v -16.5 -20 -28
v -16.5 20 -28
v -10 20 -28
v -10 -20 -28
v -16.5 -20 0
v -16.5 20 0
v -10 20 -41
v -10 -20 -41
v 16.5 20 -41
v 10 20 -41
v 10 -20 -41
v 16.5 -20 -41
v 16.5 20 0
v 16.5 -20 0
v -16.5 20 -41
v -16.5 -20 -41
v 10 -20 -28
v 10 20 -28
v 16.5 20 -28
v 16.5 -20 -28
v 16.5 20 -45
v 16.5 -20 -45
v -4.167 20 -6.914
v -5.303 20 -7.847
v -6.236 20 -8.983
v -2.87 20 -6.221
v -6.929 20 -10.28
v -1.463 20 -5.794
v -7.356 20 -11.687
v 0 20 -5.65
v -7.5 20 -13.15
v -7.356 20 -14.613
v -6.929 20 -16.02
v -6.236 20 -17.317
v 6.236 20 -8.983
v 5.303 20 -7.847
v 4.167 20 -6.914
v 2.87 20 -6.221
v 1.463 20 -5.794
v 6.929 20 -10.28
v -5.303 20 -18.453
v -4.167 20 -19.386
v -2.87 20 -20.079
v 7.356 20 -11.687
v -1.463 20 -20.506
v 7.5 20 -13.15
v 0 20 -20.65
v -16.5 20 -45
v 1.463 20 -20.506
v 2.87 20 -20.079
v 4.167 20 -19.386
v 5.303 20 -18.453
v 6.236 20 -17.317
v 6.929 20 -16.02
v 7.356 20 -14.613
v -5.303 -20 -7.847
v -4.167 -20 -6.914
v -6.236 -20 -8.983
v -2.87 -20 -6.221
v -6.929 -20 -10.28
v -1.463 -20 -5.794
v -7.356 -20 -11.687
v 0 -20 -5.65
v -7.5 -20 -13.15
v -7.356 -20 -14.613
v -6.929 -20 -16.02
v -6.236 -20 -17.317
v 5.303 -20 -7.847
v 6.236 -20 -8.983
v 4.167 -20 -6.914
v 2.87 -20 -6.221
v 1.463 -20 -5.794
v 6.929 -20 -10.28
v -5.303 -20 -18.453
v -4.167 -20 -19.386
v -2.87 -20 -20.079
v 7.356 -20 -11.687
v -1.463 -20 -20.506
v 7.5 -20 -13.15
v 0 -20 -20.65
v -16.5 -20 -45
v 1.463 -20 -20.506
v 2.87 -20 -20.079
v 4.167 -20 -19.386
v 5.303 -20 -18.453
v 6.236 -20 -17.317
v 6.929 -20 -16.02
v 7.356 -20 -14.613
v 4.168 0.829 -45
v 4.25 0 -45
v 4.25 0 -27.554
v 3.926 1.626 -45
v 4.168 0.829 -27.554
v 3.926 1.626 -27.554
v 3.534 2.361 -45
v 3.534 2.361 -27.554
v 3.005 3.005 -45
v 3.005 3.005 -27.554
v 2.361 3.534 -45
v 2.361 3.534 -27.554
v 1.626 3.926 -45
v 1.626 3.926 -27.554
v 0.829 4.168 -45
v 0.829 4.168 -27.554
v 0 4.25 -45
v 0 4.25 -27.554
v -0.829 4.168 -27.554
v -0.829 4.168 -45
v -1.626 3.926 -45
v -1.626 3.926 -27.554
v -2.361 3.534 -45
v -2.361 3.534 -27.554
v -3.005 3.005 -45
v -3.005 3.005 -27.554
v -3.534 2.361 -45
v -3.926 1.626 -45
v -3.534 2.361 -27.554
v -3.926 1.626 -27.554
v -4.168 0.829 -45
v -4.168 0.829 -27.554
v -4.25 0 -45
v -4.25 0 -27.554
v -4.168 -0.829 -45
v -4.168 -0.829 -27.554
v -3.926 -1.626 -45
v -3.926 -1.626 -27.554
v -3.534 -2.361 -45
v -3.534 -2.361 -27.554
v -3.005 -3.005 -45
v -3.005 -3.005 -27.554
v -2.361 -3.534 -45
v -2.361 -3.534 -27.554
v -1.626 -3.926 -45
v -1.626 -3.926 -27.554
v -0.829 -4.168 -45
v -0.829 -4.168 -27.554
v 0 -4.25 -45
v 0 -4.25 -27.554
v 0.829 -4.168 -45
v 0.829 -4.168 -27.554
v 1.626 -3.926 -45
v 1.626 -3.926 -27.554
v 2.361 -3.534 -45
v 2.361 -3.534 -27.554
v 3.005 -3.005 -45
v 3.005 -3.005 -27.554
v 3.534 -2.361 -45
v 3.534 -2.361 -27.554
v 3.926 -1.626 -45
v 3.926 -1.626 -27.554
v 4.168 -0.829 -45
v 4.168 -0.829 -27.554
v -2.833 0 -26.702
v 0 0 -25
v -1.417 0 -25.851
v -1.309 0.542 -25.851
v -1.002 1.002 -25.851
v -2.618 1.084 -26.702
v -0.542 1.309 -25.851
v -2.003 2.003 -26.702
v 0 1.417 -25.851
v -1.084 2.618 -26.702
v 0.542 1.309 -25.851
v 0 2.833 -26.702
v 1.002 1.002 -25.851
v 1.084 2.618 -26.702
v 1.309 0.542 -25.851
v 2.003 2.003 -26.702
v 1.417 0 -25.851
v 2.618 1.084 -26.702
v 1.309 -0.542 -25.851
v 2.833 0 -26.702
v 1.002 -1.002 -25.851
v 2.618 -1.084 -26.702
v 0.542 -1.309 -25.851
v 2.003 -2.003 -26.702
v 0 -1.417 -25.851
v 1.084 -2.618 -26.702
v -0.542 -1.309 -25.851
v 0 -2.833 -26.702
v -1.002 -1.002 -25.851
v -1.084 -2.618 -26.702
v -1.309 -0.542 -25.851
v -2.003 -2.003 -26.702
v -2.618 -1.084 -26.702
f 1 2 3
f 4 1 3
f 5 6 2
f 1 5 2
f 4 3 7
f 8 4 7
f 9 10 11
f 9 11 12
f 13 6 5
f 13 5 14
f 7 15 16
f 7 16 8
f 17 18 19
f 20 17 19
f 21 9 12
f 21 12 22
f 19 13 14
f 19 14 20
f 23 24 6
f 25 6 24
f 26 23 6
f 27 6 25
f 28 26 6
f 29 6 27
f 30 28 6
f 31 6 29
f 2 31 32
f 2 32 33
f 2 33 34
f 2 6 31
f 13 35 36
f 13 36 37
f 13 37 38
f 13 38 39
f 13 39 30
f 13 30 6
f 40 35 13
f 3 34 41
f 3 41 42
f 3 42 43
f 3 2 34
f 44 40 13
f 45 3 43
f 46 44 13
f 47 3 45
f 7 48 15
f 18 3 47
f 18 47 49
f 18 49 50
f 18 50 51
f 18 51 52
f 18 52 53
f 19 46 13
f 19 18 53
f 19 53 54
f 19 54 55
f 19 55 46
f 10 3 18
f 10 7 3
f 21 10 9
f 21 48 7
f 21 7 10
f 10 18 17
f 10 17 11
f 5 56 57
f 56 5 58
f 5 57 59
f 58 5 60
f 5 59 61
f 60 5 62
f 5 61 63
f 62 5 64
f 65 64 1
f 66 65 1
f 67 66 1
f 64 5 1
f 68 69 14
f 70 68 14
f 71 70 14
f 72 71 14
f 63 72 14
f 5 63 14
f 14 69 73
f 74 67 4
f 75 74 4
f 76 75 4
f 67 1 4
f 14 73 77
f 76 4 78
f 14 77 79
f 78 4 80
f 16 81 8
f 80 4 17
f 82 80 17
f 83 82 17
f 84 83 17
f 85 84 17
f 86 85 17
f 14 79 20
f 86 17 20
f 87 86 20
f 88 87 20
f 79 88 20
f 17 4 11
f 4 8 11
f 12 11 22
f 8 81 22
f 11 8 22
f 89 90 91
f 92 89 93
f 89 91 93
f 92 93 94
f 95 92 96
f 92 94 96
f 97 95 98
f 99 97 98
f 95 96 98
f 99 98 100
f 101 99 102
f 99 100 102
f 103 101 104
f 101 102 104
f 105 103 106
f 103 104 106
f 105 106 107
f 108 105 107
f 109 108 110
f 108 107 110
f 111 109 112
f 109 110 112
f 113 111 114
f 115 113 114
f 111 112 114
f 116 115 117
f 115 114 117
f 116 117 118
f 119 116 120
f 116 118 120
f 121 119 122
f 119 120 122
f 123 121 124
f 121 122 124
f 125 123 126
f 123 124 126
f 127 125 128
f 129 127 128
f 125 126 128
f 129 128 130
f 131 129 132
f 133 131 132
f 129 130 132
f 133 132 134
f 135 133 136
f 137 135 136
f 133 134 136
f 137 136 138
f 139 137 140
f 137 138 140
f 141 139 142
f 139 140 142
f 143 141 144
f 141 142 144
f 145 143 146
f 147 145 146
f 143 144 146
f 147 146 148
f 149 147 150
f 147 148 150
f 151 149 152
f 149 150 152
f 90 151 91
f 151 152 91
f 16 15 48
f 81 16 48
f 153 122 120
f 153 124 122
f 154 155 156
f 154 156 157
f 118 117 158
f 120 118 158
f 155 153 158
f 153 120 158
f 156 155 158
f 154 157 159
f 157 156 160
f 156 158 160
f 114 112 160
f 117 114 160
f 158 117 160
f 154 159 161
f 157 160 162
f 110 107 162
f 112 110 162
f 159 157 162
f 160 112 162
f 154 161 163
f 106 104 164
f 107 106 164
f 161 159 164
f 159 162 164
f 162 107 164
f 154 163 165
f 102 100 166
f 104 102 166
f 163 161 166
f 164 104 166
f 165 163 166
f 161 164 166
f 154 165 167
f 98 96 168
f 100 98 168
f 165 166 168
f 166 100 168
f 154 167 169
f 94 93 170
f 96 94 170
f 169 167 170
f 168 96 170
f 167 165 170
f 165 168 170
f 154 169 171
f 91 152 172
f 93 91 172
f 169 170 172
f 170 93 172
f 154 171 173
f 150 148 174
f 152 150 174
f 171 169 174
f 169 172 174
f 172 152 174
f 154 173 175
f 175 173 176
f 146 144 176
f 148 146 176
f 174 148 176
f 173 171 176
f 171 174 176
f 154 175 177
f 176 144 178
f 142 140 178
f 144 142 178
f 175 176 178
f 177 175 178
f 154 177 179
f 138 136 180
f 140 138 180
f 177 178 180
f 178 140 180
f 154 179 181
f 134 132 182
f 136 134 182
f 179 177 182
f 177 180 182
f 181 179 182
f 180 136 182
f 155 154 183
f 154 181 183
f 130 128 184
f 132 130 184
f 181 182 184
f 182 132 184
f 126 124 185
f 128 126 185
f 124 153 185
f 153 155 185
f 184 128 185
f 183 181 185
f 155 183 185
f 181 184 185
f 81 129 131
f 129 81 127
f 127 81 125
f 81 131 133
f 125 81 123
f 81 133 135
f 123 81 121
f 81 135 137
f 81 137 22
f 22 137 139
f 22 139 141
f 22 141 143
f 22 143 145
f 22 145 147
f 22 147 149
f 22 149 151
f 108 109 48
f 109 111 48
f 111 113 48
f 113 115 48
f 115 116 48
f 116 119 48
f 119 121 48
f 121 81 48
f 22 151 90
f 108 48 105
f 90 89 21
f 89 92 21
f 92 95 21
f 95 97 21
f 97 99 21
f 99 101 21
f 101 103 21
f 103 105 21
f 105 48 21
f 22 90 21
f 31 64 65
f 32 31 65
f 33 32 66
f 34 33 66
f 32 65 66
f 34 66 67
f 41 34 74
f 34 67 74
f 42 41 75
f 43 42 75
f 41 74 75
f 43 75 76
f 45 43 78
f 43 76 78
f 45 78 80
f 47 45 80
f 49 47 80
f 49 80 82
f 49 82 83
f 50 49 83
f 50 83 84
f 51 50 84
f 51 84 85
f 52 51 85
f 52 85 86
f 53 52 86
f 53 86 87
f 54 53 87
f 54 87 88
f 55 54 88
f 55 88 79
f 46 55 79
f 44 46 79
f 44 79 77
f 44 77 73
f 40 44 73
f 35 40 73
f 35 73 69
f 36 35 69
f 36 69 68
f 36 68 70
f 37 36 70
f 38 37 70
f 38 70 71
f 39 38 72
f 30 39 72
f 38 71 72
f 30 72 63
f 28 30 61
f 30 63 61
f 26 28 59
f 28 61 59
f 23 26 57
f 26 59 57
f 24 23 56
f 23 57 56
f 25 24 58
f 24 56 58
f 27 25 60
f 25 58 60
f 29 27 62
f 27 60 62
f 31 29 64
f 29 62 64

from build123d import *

# Parameters (mm, degrees)
ESBO_O1_W                      = 33
ESBO_O1_H                      = 45
RESSALTO_EXTRUS_O1_DEPTH       = 20
FURO_DE_DI_METRO_15_0_15_1_D   = 15
FURO_ROSCADO_DE_M10X1_51_D     = 8.5
FURO_ROSCADO_DE_M10X1_51_DEPTH = 17.446342369
FURO_ROSCADO_DE_M10X1_51_TIP   = 2.553657631
ESBO_O6_W                      = 6.5
ESBO_O6_H                      = 13
CORTE_EXTRUS_O1_DEPTH          = 63.42795848


with BuildPart() as part:
    # Esboço1 → Ressalto-extrusão1 (new, symmetric)
    with BuildSketch(Plane(origin=(0, 0, 0), x_dir=(1, 0, 0), z_dir=(0, 1, 0))):
        with Locations((0, 22.5)):
            Rectangle(ESBO_O1_W, ESBO_O1_H)
    extrude(amount=RESSALTO_EXTRUS_O1_DEPTH, both=True)

    # Furo de diâmetro Ø15.0 (15)1 (through all)
    with Locations(Plane(origin=(0, 20, 0), x_dir=(1, 0, 0), z_dir=(0, 1, 0))):
        with Locations((0, 13.15)):
            Hole(FURO_DE_DI_METRO_15_0_15_1_D / 2)

    # Furo roscado de M10x1.51
    with Locations(Plane(origin=(0, 0, -45), x_dir=(-1, 0, 0), z_dir=(0, 0, -1))):
        with Locations((0, 0)):
            Hole(FURO_ROSCADO_DE_M10X1_51_D / 2, depth=FURO_ROSCADO_DE_M10X1_51_DEPTH)
            with Locations((0, 0, -(FURO_ROSCADO_DE_M10X1_51_DEPTH + FURO_ROSCADO_DE_M10X1_51_TIP / 2))):  # 118° drill point
                Cone(0, FURO_ROSCADO_DE_M10X1_51_D / 2, FURO_ROSCADO_DE_M10X1_51_TIP, mode=Mode.SUBTRACT)

    # Esboço6 → Corte-extrusão1 (cut, through all)
    with BuildSketch(Plane(origin=(0, 20, 0), x_dir=(1, 0, 0), z_dir=(0, 1, 0))):
        with Locations((-13.25, 34.5)):
            Rectangle(ESBO_O6_W, ESBO_O6_H)
        with Locations((13.25, 34.5)):
            Rectangle(ESBO_O6_W, ESBO_O6_H)
    extrude(amount=-CORTE_EXTRUS_O1_DEPTH, mode=Mode.SUBTRACT)


solid = part.part
